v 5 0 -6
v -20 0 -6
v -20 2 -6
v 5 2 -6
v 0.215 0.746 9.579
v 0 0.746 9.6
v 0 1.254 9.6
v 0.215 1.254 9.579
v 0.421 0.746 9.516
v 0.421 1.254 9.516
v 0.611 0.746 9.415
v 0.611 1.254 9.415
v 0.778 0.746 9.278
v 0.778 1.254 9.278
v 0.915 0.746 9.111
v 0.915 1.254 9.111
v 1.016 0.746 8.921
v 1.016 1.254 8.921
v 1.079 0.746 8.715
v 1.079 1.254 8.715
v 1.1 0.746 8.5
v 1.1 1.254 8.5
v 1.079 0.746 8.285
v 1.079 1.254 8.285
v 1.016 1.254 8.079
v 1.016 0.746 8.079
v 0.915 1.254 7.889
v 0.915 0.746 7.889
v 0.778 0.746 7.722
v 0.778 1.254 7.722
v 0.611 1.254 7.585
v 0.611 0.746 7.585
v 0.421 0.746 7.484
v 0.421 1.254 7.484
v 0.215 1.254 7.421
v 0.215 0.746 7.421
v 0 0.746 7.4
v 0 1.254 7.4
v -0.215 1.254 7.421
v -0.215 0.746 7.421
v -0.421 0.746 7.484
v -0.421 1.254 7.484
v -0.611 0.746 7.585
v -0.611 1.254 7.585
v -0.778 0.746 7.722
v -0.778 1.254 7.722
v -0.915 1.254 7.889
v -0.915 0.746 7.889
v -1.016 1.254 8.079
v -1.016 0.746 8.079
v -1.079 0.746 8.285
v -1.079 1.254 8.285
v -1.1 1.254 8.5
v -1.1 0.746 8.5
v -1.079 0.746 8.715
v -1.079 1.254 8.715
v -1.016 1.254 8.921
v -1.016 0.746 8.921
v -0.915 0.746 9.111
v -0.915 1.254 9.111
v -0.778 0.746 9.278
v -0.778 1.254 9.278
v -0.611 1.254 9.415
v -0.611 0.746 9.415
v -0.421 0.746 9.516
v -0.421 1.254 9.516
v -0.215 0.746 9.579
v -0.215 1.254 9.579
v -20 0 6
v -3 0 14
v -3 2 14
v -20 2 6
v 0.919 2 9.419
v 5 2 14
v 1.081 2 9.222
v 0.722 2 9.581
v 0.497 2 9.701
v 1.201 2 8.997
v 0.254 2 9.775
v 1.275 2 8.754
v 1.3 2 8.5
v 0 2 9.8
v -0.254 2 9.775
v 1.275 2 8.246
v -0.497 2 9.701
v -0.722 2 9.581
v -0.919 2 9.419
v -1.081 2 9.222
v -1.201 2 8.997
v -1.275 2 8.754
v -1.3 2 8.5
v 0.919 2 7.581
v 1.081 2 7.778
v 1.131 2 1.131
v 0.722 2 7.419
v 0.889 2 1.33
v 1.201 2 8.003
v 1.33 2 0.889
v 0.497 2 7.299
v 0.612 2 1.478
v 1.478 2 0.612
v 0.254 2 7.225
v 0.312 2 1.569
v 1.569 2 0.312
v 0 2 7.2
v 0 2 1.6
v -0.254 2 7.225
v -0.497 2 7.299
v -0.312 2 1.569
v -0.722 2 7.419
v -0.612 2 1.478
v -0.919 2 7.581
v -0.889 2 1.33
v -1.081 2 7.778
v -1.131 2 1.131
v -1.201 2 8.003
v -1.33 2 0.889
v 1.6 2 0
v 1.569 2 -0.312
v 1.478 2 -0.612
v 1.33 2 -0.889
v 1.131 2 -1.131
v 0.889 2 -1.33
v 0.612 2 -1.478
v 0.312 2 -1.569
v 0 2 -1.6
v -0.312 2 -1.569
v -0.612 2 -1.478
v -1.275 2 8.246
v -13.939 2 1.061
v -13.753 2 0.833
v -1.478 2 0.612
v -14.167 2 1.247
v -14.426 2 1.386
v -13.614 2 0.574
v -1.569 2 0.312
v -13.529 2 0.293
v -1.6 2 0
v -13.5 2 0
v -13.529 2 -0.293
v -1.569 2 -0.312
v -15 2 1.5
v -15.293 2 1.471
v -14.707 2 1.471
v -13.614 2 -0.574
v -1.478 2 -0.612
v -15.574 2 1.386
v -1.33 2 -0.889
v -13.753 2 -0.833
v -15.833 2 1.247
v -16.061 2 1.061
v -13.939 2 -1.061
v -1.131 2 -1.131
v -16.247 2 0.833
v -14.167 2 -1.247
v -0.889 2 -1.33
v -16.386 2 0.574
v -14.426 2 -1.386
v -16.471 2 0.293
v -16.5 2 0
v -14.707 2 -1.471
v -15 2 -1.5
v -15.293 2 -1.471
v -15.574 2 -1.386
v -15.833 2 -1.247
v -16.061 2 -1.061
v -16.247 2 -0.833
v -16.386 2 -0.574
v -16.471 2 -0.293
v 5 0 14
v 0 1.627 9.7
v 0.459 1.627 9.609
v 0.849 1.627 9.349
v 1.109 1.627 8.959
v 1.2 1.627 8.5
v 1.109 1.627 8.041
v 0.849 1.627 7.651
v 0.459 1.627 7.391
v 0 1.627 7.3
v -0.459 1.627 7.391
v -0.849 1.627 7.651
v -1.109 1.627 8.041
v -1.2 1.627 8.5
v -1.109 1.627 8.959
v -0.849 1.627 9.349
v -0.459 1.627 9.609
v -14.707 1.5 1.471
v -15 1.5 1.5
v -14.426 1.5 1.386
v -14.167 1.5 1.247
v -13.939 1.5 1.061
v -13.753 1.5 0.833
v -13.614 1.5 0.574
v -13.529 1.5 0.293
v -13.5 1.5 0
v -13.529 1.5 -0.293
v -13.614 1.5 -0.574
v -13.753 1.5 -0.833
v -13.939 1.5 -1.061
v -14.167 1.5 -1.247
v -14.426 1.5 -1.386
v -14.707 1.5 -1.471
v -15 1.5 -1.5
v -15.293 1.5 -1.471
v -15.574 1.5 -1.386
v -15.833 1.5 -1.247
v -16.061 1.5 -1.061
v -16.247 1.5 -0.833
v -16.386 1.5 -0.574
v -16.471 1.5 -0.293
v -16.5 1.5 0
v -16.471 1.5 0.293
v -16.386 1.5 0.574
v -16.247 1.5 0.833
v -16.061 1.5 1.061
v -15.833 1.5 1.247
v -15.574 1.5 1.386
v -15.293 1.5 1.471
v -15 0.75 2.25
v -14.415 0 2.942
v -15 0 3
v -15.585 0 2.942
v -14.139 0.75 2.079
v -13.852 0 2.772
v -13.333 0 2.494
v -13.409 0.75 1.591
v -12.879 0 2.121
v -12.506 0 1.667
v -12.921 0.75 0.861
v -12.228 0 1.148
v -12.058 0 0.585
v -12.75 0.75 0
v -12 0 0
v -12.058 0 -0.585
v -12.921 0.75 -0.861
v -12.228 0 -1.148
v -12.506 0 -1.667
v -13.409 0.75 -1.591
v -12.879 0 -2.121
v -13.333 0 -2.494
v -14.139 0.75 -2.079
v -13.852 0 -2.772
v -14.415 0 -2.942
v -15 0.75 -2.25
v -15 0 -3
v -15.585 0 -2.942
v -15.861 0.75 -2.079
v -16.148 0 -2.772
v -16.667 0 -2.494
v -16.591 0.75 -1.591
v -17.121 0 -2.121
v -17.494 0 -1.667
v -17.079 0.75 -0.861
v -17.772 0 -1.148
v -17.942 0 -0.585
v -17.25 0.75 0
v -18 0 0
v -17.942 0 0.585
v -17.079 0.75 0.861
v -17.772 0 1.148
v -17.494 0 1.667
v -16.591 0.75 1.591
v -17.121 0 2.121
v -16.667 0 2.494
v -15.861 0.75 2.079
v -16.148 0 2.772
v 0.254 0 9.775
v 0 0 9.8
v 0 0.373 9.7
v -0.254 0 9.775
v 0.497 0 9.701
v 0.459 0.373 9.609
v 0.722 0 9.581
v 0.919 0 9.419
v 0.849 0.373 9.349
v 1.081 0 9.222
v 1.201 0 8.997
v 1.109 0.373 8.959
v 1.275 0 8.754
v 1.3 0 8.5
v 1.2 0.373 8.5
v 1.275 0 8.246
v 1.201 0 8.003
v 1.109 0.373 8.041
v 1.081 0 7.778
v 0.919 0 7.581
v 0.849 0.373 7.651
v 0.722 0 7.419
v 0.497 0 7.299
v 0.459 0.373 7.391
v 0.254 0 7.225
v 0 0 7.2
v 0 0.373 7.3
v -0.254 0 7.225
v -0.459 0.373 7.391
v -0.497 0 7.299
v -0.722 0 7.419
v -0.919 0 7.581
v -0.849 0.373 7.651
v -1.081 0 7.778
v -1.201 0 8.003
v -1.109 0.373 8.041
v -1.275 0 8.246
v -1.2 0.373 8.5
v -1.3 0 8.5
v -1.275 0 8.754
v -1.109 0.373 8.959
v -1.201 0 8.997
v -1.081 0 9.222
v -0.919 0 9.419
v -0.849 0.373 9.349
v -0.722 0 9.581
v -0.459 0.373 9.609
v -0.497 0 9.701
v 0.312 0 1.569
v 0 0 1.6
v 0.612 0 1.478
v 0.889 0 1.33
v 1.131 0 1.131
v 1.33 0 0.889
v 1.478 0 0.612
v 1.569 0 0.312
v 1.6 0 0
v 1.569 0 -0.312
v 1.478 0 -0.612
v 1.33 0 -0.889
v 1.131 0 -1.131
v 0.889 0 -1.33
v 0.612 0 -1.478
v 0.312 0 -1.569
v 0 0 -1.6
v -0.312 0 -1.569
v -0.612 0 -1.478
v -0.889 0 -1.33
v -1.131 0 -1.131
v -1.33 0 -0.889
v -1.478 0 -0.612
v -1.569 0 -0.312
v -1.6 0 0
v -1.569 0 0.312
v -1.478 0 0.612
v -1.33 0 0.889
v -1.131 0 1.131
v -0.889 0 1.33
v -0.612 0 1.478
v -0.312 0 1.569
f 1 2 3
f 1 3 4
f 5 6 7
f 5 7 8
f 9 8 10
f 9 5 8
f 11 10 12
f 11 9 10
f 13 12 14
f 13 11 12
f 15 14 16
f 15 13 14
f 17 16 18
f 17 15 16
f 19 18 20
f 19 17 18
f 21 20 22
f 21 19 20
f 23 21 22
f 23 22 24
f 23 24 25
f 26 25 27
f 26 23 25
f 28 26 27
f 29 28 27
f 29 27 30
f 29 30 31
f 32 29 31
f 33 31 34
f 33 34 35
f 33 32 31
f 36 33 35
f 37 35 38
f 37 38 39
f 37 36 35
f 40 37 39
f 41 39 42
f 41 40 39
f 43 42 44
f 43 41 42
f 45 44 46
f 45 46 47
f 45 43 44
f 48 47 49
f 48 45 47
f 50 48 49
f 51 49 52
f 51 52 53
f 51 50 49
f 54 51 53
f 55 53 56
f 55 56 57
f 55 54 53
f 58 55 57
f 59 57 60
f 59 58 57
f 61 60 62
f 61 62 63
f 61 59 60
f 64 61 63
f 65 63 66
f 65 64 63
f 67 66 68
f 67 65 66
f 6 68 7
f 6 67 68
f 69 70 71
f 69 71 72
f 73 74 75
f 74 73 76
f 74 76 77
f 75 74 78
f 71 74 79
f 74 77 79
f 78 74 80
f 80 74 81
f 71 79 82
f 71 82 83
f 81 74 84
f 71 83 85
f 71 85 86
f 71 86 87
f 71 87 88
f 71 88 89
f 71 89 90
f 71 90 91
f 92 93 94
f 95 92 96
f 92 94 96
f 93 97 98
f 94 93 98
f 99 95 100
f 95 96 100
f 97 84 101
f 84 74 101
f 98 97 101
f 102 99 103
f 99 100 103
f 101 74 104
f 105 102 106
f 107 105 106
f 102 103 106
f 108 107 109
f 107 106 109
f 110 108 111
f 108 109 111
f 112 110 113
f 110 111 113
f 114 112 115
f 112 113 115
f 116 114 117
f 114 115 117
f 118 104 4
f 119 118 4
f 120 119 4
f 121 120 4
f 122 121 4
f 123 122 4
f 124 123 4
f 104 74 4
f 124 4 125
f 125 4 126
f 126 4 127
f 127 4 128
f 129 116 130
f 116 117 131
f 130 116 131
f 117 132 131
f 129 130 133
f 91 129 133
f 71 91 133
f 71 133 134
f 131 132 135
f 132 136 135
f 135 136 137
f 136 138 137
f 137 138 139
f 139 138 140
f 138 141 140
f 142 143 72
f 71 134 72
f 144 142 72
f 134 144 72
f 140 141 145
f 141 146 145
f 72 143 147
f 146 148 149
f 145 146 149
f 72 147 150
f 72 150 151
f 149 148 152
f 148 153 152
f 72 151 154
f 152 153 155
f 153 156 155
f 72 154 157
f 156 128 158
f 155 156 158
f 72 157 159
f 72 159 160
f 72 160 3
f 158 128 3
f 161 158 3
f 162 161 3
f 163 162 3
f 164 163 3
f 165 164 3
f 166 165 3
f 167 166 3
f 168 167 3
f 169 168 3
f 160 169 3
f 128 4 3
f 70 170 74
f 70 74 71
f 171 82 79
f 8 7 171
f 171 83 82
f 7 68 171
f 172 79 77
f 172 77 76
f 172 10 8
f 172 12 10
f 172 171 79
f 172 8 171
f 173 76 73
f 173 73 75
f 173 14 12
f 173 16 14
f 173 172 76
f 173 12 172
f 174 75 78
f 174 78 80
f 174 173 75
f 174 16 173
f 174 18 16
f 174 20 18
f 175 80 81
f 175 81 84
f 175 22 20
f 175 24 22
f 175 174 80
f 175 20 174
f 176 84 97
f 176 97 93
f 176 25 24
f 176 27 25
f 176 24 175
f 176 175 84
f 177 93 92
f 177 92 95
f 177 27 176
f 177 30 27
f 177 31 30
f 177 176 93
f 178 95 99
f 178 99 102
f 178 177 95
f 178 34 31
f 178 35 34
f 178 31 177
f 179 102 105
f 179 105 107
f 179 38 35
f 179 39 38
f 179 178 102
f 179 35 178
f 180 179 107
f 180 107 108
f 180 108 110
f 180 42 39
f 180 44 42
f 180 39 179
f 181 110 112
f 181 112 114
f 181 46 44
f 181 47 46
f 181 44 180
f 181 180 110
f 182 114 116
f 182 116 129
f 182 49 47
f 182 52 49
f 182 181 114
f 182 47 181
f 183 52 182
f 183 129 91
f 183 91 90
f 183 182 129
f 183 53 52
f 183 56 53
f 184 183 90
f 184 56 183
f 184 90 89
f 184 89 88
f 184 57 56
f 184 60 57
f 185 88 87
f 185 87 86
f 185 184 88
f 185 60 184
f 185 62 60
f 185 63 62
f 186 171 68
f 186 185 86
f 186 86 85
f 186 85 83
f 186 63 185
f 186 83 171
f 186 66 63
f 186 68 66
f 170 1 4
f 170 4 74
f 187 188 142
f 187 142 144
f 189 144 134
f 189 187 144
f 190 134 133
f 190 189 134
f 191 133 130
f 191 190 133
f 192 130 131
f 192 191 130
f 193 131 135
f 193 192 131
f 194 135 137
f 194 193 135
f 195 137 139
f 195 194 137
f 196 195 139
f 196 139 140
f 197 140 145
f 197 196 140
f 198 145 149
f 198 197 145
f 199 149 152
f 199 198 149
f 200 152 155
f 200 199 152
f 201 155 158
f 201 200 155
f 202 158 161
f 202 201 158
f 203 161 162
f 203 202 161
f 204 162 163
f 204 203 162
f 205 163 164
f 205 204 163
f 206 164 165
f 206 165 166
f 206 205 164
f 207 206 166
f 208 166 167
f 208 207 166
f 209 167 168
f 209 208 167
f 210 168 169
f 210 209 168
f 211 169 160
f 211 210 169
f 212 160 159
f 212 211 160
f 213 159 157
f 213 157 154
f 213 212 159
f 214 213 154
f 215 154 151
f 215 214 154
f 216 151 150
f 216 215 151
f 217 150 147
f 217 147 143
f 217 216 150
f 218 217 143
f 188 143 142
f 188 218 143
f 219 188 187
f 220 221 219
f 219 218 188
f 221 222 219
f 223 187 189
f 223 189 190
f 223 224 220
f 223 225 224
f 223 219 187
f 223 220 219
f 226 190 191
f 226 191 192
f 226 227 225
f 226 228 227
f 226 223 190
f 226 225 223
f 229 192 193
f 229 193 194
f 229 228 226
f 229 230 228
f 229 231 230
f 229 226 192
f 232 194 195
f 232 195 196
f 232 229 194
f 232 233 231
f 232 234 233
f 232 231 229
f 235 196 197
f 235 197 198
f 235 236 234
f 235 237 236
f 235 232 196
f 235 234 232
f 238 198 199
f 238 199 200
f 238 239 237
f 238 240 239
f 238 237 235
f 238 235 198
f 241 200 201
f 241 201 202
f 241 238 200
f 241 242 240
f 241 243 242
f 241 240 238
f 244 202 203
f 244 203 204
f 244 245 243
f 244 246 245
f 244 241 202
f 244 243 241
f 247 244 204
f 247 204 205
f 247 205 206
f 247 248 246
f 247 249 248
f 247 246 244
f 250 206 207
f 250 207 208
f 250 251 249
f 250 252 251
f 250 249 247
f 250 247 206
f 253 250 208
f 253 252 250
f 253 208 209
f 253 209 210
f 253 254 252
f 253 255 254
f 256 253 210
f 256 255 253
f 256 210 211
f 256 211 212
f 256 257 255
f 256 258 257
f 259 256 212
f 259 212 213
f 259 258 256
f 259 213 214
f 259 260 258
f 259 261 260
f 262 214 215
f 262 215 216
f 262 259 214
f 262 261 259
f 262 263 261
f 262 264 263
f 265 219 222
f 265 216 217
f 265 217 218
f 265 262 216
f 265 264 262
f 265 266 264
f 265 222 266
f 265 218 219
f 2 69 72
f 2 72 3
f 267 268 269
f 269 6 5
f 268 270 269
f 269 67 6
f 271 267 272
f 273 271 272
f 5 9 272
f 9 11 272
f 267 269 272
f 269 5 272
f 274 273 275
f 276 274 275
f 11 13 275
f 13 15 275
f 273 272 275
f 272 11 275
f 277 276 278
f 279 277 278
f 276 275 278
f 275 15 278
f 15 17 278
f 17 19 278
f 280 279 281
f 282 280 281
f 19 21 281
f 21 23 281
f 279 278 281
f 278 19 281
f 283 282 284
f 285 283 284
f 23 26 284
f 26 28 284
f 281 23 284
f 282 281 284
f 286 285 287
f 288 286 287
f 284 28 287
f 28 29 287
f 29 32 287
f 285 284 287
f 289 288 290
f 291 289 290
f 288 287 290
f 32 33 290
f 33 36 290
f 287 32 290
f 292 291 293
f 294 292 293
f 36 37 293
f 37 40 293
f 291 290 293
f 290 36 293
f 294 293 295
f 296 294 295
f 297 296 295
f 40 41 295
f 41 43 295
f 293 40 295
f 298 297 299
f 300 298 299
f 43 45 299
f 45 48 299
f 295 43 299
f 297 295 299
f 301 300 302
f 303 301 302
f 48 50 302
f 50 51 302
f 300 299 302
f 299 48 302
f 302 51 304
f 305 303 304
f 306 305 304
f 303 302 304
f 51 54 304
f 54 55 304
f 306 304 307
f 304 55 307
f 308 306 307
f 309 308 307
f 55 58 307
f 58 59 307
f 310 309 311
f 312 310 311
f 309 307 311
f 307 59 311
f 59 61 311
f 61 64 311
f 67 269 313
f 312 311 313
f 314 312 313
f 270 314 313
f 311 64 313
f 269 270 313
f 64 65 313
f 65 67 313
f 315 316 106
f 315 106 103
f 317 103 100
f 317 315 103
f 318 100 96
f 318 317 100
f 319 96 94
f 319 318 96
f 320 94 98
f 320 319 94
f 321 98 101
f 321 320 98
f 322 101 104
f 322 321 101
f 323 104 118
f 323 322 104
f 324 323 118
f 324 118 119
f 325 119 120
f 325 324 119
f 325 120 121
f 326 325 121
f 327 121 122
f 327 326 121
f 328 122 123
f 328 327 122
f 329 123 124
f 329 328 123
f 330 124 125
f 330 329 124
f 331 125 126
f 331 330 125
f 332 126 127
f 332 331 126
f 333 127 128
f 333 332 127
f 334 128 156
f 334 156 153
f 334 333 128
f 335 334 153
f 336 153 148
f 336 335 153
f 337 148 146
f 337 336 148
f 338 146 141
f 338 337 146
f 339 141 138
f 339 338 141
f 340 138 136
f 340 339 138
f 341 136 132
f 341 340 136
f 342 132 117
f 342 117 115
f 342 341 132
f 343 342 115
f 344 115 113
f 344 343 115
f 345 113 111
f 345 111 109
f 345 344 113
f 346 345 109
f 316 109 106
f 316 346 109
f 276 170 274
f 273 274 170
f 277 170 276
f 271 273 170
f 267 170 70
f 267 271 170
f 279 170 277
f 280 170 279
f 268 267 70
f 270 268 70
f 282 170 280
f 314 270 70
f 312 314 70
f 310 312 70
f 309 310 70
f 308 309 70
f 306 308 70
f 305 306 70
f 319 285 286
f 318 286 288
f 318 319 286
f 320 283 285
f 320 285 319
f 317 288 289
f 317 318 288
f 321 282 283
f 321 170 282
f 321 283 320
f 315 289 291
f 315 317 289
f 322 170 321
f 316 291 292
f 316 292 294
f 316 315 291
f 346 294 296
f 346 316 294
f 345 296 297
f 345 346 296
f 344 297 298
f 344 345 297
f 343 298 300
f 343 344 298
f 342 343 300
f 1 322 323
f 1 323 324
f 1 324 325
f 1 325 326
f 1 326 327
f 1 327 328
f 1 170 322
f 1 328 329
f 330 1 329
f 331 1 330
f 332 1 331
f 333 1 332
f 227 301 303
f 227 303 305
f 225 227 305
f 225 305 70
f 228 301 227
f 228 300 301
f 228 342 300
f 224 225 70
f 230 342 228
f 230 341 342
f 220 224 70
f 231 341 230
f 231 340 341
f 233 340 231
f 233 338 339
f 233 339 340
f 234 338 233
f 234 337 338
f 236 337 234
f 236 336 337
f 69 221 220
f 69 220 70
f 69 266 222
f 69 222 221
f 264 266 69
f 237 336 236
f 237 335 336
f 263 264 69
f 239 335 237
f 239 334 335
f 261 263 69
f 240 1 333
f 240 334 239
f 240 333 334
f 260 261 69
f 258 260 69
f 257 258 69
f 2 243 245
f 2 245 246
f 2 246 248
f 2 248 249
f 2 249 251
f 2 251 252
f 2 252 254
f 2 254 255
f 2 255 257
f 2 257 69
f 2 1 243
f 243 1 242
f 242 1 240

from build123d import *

# Parameters (mm, degrees)
SKETCH1_R             = 1.6
SKETCH1_R_2           = 1.5
SKETCH1_R_3           = 1.1
EXTRUDE1_DEPTH        = 2
CHAMFER1_SIZE         = 1.5
CHAMFER2_SIZE         = 0.2
CHAMFER2_SIZE2        = 0.746410162
CHAMFER2_PART_2_SIZE  = 0.2
CHAMFER2_PART_2_SIZE2 = 0.746410162


with BuildPart() as part:
    # Sketch1 → Extrude1 (new body)
    with BuildSketch(Plane(origin=(0, 0, 0), x_dir=(1, 0, 0), z_dir=(0, 1, 0))):
        Polygon((-20, 6), (5, 6), (5, -14), (-3, -14), (-20, -6), align=None)
        with Locations(Location((0, 0, 0), (0, 0, 270))):  # turned: the seam where the file's is
            Circle(SKETCH1_R, mode=Mode.SUBTRACT)
        with Locations(Location((-15, 0, 0), (0, 0, 270))):  # turned: the seam where the file's is
            Circle(SKETCH1_R_2, mode=Mode.SUBTRACT)
        with Locations(Location((0, -8.5, 0), (0, 0, 270))):  # turned: the seam where the file's is
            Circle(SKETCH1_R_3, mode=Mode.SUBTRACT)
    extrude(amount=EXTRUDE1_DEPTH)

    # Chamfer1
    chamfer1_edges = [part.edges().sort_by_distance(p)[0] for p in [
        (-15, 0, -1.5),
    ]]
    chamfer(chamfer1_edges, length=CHAMFER1_SIZE)

    # Chamfer2
    chamfer2_edges = [part.edges().sort_by_distance(p)[0] for p in [
        (0, 0, 7.4),
    ]]
    chamfer2_side = [part.faces().sort_by_distance(p)[0] for p in [
        (-5.999814113, 0, 3.054548244),
    ]]
    chamfer(chamfer2_edges, length=CHAMFER2_SIZE, length2=CHAMFER2_SIZE2, reference=chamfer2_side[0])

    # Chamfer2 part 2
    chamfer2_part_2_edges = [part.edges().sort_by_distance(p)[0] for p in [
        (0, 2, 7.4),
    ]]
    chamfer2_part_2_side = [part.faces().sort_by_distance(p)[0] for p in [
        (-6.46183643, 2, 2.897743765),
    ]]
    chamfer(chamfer2_part_2_edges, length=CHAMFER2_PART_2_SIZE, length2=CHAMFER2_PART_2_SIZE2, reference=chamfer2_part_2_side[0])


solid = part.part
